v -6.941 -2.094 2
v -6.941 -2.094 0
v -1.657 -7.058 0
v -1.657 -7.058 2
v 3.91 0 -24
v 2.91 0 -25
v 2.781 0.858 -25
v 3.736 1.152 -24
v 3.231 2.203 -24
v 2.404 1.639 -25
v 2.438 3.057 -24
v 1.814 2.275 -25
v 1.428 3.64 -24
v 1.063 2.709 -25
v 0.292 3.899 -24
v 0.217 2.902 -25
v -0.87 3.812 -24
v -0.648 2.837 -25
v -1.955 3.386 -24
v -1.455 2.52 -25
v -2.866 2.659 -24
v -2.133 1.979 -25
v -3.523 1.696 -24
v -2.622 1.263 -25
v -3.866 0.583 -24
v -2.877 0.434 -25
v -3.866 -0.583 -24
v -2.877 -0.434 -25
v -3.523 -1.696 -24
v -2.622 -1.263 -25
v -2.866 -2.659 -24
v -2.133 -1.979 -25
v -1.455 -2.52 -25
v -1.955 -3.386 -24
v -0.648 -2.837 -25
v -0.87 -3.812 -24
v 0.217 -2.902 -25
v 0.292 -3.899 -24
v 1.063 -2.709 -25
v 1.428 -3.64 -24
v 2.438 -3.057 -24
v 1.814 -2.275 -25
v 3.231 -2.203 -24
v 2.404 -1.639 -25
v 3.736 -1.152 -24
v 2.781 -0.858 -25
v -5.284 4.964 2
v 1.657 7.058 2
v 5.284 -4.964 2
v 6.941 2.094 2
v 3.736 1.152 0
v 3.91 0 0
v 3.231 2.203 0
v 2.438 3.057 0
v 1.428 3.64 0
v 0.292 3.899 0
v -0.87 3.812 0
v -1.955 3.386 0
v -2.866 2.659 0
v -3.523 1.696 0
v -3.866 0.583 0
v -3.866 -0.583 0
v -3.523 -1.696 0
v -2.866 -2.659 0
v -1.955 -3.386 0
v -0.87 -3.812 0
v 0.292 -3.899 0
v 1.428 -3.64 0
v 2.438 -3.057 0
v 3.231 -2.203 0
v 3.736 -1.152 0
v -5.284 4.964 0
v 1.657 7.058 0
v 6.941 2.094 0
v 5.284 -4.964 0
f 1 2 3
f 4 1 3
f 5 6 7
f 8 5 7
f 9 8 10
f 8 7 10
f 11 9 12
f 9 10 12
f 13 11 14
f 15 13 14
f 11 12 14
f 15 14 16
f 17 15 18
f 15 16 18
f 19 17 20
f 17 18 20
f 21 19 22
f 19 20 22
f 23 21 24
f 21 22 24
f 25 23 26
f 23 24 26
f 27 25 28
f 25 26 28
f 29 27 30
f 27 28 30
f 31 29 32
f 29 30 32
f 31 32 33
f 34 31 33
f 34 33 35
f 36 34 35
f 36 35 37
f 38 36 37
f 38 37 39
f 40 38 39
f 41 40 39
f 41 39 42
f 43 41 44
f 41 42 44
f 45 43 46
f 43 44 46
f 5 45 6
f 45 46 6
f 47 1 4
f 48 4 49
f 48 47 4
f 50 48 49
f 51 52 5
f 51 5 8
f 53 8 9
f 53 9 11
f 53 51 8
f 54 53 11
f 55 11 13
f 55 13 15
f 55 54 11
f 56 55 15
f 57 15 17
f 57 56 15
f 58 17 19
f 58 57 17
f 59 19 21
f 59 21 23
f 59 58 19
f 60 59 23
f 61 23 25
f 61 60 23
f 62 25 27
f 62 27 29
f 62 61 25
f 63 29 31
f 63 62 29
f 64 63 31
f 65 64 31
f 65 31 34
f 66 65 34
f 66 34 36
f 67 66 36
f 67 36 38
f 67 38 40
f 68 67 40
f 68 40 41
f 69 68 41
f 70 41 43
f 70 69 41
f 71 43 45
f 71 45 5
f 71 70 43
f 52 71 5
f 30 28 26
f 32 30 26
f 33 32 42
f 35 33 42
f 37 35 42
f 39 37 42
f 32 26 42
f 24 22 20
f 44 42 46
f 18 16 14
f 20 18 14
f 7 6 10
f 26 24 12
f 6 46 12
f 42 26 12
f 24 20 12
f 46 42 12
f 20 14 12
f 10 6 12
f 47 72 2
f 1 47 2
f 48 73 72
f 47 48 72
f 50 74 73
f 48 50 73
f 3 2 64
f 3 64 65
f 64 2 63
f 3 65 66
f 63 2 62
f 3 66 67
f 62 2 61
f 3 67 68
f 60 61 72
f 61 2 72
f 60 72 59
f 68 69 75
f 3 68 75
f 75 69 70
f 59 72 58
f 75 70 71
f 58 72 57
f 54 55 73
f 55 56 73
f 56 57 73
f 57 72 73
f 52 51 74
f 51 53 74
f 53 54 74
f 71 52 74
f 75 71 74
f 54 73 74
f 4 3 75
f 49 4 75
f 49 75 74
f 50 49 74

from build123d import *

# Parameters (mm, degrees)
F0_R      = 3.91
F1_DEPTH  = 25
F1_FACE_R = 3.91
F2_DEPTH  = 2
F3_SIZE   = 1


with BuildPart() as f1:
    # F0 (on Top) → F1 (new body)
    with BuildSketch(Plane.XY):
        Circle(F0_R)
    extrude(amount=-F1_DEPTH)

    # F0 (on Top) + F1_face (on face) → F2 (join)
    with BuildSketch(Plane.XY):
        Polygon((5.284141717, -4.9639043418), (6.9409381205, 2.0942487932), (1.6567964035, 7.058153135), (-5.284141717, 4.9639043418), (-6.9409381205, -2.0942487932), (-1.6567964035, -7.058153135), align=None)
        Circle(F0_R, mode=Mode.SUBTRACT)
    with BuildSketch(Plane.XY):
        Circle(F1_FACE_R)
    extrude(amount=F2_DEPTH)

    # F3
    f3_edges = [f1.edges().sort_by_distance(p)[0] for p in [
        (-3.91, 0, -25),
    ]]
    chamfer(f3_edges, length=F3_SIZE)


solid = f1.part
